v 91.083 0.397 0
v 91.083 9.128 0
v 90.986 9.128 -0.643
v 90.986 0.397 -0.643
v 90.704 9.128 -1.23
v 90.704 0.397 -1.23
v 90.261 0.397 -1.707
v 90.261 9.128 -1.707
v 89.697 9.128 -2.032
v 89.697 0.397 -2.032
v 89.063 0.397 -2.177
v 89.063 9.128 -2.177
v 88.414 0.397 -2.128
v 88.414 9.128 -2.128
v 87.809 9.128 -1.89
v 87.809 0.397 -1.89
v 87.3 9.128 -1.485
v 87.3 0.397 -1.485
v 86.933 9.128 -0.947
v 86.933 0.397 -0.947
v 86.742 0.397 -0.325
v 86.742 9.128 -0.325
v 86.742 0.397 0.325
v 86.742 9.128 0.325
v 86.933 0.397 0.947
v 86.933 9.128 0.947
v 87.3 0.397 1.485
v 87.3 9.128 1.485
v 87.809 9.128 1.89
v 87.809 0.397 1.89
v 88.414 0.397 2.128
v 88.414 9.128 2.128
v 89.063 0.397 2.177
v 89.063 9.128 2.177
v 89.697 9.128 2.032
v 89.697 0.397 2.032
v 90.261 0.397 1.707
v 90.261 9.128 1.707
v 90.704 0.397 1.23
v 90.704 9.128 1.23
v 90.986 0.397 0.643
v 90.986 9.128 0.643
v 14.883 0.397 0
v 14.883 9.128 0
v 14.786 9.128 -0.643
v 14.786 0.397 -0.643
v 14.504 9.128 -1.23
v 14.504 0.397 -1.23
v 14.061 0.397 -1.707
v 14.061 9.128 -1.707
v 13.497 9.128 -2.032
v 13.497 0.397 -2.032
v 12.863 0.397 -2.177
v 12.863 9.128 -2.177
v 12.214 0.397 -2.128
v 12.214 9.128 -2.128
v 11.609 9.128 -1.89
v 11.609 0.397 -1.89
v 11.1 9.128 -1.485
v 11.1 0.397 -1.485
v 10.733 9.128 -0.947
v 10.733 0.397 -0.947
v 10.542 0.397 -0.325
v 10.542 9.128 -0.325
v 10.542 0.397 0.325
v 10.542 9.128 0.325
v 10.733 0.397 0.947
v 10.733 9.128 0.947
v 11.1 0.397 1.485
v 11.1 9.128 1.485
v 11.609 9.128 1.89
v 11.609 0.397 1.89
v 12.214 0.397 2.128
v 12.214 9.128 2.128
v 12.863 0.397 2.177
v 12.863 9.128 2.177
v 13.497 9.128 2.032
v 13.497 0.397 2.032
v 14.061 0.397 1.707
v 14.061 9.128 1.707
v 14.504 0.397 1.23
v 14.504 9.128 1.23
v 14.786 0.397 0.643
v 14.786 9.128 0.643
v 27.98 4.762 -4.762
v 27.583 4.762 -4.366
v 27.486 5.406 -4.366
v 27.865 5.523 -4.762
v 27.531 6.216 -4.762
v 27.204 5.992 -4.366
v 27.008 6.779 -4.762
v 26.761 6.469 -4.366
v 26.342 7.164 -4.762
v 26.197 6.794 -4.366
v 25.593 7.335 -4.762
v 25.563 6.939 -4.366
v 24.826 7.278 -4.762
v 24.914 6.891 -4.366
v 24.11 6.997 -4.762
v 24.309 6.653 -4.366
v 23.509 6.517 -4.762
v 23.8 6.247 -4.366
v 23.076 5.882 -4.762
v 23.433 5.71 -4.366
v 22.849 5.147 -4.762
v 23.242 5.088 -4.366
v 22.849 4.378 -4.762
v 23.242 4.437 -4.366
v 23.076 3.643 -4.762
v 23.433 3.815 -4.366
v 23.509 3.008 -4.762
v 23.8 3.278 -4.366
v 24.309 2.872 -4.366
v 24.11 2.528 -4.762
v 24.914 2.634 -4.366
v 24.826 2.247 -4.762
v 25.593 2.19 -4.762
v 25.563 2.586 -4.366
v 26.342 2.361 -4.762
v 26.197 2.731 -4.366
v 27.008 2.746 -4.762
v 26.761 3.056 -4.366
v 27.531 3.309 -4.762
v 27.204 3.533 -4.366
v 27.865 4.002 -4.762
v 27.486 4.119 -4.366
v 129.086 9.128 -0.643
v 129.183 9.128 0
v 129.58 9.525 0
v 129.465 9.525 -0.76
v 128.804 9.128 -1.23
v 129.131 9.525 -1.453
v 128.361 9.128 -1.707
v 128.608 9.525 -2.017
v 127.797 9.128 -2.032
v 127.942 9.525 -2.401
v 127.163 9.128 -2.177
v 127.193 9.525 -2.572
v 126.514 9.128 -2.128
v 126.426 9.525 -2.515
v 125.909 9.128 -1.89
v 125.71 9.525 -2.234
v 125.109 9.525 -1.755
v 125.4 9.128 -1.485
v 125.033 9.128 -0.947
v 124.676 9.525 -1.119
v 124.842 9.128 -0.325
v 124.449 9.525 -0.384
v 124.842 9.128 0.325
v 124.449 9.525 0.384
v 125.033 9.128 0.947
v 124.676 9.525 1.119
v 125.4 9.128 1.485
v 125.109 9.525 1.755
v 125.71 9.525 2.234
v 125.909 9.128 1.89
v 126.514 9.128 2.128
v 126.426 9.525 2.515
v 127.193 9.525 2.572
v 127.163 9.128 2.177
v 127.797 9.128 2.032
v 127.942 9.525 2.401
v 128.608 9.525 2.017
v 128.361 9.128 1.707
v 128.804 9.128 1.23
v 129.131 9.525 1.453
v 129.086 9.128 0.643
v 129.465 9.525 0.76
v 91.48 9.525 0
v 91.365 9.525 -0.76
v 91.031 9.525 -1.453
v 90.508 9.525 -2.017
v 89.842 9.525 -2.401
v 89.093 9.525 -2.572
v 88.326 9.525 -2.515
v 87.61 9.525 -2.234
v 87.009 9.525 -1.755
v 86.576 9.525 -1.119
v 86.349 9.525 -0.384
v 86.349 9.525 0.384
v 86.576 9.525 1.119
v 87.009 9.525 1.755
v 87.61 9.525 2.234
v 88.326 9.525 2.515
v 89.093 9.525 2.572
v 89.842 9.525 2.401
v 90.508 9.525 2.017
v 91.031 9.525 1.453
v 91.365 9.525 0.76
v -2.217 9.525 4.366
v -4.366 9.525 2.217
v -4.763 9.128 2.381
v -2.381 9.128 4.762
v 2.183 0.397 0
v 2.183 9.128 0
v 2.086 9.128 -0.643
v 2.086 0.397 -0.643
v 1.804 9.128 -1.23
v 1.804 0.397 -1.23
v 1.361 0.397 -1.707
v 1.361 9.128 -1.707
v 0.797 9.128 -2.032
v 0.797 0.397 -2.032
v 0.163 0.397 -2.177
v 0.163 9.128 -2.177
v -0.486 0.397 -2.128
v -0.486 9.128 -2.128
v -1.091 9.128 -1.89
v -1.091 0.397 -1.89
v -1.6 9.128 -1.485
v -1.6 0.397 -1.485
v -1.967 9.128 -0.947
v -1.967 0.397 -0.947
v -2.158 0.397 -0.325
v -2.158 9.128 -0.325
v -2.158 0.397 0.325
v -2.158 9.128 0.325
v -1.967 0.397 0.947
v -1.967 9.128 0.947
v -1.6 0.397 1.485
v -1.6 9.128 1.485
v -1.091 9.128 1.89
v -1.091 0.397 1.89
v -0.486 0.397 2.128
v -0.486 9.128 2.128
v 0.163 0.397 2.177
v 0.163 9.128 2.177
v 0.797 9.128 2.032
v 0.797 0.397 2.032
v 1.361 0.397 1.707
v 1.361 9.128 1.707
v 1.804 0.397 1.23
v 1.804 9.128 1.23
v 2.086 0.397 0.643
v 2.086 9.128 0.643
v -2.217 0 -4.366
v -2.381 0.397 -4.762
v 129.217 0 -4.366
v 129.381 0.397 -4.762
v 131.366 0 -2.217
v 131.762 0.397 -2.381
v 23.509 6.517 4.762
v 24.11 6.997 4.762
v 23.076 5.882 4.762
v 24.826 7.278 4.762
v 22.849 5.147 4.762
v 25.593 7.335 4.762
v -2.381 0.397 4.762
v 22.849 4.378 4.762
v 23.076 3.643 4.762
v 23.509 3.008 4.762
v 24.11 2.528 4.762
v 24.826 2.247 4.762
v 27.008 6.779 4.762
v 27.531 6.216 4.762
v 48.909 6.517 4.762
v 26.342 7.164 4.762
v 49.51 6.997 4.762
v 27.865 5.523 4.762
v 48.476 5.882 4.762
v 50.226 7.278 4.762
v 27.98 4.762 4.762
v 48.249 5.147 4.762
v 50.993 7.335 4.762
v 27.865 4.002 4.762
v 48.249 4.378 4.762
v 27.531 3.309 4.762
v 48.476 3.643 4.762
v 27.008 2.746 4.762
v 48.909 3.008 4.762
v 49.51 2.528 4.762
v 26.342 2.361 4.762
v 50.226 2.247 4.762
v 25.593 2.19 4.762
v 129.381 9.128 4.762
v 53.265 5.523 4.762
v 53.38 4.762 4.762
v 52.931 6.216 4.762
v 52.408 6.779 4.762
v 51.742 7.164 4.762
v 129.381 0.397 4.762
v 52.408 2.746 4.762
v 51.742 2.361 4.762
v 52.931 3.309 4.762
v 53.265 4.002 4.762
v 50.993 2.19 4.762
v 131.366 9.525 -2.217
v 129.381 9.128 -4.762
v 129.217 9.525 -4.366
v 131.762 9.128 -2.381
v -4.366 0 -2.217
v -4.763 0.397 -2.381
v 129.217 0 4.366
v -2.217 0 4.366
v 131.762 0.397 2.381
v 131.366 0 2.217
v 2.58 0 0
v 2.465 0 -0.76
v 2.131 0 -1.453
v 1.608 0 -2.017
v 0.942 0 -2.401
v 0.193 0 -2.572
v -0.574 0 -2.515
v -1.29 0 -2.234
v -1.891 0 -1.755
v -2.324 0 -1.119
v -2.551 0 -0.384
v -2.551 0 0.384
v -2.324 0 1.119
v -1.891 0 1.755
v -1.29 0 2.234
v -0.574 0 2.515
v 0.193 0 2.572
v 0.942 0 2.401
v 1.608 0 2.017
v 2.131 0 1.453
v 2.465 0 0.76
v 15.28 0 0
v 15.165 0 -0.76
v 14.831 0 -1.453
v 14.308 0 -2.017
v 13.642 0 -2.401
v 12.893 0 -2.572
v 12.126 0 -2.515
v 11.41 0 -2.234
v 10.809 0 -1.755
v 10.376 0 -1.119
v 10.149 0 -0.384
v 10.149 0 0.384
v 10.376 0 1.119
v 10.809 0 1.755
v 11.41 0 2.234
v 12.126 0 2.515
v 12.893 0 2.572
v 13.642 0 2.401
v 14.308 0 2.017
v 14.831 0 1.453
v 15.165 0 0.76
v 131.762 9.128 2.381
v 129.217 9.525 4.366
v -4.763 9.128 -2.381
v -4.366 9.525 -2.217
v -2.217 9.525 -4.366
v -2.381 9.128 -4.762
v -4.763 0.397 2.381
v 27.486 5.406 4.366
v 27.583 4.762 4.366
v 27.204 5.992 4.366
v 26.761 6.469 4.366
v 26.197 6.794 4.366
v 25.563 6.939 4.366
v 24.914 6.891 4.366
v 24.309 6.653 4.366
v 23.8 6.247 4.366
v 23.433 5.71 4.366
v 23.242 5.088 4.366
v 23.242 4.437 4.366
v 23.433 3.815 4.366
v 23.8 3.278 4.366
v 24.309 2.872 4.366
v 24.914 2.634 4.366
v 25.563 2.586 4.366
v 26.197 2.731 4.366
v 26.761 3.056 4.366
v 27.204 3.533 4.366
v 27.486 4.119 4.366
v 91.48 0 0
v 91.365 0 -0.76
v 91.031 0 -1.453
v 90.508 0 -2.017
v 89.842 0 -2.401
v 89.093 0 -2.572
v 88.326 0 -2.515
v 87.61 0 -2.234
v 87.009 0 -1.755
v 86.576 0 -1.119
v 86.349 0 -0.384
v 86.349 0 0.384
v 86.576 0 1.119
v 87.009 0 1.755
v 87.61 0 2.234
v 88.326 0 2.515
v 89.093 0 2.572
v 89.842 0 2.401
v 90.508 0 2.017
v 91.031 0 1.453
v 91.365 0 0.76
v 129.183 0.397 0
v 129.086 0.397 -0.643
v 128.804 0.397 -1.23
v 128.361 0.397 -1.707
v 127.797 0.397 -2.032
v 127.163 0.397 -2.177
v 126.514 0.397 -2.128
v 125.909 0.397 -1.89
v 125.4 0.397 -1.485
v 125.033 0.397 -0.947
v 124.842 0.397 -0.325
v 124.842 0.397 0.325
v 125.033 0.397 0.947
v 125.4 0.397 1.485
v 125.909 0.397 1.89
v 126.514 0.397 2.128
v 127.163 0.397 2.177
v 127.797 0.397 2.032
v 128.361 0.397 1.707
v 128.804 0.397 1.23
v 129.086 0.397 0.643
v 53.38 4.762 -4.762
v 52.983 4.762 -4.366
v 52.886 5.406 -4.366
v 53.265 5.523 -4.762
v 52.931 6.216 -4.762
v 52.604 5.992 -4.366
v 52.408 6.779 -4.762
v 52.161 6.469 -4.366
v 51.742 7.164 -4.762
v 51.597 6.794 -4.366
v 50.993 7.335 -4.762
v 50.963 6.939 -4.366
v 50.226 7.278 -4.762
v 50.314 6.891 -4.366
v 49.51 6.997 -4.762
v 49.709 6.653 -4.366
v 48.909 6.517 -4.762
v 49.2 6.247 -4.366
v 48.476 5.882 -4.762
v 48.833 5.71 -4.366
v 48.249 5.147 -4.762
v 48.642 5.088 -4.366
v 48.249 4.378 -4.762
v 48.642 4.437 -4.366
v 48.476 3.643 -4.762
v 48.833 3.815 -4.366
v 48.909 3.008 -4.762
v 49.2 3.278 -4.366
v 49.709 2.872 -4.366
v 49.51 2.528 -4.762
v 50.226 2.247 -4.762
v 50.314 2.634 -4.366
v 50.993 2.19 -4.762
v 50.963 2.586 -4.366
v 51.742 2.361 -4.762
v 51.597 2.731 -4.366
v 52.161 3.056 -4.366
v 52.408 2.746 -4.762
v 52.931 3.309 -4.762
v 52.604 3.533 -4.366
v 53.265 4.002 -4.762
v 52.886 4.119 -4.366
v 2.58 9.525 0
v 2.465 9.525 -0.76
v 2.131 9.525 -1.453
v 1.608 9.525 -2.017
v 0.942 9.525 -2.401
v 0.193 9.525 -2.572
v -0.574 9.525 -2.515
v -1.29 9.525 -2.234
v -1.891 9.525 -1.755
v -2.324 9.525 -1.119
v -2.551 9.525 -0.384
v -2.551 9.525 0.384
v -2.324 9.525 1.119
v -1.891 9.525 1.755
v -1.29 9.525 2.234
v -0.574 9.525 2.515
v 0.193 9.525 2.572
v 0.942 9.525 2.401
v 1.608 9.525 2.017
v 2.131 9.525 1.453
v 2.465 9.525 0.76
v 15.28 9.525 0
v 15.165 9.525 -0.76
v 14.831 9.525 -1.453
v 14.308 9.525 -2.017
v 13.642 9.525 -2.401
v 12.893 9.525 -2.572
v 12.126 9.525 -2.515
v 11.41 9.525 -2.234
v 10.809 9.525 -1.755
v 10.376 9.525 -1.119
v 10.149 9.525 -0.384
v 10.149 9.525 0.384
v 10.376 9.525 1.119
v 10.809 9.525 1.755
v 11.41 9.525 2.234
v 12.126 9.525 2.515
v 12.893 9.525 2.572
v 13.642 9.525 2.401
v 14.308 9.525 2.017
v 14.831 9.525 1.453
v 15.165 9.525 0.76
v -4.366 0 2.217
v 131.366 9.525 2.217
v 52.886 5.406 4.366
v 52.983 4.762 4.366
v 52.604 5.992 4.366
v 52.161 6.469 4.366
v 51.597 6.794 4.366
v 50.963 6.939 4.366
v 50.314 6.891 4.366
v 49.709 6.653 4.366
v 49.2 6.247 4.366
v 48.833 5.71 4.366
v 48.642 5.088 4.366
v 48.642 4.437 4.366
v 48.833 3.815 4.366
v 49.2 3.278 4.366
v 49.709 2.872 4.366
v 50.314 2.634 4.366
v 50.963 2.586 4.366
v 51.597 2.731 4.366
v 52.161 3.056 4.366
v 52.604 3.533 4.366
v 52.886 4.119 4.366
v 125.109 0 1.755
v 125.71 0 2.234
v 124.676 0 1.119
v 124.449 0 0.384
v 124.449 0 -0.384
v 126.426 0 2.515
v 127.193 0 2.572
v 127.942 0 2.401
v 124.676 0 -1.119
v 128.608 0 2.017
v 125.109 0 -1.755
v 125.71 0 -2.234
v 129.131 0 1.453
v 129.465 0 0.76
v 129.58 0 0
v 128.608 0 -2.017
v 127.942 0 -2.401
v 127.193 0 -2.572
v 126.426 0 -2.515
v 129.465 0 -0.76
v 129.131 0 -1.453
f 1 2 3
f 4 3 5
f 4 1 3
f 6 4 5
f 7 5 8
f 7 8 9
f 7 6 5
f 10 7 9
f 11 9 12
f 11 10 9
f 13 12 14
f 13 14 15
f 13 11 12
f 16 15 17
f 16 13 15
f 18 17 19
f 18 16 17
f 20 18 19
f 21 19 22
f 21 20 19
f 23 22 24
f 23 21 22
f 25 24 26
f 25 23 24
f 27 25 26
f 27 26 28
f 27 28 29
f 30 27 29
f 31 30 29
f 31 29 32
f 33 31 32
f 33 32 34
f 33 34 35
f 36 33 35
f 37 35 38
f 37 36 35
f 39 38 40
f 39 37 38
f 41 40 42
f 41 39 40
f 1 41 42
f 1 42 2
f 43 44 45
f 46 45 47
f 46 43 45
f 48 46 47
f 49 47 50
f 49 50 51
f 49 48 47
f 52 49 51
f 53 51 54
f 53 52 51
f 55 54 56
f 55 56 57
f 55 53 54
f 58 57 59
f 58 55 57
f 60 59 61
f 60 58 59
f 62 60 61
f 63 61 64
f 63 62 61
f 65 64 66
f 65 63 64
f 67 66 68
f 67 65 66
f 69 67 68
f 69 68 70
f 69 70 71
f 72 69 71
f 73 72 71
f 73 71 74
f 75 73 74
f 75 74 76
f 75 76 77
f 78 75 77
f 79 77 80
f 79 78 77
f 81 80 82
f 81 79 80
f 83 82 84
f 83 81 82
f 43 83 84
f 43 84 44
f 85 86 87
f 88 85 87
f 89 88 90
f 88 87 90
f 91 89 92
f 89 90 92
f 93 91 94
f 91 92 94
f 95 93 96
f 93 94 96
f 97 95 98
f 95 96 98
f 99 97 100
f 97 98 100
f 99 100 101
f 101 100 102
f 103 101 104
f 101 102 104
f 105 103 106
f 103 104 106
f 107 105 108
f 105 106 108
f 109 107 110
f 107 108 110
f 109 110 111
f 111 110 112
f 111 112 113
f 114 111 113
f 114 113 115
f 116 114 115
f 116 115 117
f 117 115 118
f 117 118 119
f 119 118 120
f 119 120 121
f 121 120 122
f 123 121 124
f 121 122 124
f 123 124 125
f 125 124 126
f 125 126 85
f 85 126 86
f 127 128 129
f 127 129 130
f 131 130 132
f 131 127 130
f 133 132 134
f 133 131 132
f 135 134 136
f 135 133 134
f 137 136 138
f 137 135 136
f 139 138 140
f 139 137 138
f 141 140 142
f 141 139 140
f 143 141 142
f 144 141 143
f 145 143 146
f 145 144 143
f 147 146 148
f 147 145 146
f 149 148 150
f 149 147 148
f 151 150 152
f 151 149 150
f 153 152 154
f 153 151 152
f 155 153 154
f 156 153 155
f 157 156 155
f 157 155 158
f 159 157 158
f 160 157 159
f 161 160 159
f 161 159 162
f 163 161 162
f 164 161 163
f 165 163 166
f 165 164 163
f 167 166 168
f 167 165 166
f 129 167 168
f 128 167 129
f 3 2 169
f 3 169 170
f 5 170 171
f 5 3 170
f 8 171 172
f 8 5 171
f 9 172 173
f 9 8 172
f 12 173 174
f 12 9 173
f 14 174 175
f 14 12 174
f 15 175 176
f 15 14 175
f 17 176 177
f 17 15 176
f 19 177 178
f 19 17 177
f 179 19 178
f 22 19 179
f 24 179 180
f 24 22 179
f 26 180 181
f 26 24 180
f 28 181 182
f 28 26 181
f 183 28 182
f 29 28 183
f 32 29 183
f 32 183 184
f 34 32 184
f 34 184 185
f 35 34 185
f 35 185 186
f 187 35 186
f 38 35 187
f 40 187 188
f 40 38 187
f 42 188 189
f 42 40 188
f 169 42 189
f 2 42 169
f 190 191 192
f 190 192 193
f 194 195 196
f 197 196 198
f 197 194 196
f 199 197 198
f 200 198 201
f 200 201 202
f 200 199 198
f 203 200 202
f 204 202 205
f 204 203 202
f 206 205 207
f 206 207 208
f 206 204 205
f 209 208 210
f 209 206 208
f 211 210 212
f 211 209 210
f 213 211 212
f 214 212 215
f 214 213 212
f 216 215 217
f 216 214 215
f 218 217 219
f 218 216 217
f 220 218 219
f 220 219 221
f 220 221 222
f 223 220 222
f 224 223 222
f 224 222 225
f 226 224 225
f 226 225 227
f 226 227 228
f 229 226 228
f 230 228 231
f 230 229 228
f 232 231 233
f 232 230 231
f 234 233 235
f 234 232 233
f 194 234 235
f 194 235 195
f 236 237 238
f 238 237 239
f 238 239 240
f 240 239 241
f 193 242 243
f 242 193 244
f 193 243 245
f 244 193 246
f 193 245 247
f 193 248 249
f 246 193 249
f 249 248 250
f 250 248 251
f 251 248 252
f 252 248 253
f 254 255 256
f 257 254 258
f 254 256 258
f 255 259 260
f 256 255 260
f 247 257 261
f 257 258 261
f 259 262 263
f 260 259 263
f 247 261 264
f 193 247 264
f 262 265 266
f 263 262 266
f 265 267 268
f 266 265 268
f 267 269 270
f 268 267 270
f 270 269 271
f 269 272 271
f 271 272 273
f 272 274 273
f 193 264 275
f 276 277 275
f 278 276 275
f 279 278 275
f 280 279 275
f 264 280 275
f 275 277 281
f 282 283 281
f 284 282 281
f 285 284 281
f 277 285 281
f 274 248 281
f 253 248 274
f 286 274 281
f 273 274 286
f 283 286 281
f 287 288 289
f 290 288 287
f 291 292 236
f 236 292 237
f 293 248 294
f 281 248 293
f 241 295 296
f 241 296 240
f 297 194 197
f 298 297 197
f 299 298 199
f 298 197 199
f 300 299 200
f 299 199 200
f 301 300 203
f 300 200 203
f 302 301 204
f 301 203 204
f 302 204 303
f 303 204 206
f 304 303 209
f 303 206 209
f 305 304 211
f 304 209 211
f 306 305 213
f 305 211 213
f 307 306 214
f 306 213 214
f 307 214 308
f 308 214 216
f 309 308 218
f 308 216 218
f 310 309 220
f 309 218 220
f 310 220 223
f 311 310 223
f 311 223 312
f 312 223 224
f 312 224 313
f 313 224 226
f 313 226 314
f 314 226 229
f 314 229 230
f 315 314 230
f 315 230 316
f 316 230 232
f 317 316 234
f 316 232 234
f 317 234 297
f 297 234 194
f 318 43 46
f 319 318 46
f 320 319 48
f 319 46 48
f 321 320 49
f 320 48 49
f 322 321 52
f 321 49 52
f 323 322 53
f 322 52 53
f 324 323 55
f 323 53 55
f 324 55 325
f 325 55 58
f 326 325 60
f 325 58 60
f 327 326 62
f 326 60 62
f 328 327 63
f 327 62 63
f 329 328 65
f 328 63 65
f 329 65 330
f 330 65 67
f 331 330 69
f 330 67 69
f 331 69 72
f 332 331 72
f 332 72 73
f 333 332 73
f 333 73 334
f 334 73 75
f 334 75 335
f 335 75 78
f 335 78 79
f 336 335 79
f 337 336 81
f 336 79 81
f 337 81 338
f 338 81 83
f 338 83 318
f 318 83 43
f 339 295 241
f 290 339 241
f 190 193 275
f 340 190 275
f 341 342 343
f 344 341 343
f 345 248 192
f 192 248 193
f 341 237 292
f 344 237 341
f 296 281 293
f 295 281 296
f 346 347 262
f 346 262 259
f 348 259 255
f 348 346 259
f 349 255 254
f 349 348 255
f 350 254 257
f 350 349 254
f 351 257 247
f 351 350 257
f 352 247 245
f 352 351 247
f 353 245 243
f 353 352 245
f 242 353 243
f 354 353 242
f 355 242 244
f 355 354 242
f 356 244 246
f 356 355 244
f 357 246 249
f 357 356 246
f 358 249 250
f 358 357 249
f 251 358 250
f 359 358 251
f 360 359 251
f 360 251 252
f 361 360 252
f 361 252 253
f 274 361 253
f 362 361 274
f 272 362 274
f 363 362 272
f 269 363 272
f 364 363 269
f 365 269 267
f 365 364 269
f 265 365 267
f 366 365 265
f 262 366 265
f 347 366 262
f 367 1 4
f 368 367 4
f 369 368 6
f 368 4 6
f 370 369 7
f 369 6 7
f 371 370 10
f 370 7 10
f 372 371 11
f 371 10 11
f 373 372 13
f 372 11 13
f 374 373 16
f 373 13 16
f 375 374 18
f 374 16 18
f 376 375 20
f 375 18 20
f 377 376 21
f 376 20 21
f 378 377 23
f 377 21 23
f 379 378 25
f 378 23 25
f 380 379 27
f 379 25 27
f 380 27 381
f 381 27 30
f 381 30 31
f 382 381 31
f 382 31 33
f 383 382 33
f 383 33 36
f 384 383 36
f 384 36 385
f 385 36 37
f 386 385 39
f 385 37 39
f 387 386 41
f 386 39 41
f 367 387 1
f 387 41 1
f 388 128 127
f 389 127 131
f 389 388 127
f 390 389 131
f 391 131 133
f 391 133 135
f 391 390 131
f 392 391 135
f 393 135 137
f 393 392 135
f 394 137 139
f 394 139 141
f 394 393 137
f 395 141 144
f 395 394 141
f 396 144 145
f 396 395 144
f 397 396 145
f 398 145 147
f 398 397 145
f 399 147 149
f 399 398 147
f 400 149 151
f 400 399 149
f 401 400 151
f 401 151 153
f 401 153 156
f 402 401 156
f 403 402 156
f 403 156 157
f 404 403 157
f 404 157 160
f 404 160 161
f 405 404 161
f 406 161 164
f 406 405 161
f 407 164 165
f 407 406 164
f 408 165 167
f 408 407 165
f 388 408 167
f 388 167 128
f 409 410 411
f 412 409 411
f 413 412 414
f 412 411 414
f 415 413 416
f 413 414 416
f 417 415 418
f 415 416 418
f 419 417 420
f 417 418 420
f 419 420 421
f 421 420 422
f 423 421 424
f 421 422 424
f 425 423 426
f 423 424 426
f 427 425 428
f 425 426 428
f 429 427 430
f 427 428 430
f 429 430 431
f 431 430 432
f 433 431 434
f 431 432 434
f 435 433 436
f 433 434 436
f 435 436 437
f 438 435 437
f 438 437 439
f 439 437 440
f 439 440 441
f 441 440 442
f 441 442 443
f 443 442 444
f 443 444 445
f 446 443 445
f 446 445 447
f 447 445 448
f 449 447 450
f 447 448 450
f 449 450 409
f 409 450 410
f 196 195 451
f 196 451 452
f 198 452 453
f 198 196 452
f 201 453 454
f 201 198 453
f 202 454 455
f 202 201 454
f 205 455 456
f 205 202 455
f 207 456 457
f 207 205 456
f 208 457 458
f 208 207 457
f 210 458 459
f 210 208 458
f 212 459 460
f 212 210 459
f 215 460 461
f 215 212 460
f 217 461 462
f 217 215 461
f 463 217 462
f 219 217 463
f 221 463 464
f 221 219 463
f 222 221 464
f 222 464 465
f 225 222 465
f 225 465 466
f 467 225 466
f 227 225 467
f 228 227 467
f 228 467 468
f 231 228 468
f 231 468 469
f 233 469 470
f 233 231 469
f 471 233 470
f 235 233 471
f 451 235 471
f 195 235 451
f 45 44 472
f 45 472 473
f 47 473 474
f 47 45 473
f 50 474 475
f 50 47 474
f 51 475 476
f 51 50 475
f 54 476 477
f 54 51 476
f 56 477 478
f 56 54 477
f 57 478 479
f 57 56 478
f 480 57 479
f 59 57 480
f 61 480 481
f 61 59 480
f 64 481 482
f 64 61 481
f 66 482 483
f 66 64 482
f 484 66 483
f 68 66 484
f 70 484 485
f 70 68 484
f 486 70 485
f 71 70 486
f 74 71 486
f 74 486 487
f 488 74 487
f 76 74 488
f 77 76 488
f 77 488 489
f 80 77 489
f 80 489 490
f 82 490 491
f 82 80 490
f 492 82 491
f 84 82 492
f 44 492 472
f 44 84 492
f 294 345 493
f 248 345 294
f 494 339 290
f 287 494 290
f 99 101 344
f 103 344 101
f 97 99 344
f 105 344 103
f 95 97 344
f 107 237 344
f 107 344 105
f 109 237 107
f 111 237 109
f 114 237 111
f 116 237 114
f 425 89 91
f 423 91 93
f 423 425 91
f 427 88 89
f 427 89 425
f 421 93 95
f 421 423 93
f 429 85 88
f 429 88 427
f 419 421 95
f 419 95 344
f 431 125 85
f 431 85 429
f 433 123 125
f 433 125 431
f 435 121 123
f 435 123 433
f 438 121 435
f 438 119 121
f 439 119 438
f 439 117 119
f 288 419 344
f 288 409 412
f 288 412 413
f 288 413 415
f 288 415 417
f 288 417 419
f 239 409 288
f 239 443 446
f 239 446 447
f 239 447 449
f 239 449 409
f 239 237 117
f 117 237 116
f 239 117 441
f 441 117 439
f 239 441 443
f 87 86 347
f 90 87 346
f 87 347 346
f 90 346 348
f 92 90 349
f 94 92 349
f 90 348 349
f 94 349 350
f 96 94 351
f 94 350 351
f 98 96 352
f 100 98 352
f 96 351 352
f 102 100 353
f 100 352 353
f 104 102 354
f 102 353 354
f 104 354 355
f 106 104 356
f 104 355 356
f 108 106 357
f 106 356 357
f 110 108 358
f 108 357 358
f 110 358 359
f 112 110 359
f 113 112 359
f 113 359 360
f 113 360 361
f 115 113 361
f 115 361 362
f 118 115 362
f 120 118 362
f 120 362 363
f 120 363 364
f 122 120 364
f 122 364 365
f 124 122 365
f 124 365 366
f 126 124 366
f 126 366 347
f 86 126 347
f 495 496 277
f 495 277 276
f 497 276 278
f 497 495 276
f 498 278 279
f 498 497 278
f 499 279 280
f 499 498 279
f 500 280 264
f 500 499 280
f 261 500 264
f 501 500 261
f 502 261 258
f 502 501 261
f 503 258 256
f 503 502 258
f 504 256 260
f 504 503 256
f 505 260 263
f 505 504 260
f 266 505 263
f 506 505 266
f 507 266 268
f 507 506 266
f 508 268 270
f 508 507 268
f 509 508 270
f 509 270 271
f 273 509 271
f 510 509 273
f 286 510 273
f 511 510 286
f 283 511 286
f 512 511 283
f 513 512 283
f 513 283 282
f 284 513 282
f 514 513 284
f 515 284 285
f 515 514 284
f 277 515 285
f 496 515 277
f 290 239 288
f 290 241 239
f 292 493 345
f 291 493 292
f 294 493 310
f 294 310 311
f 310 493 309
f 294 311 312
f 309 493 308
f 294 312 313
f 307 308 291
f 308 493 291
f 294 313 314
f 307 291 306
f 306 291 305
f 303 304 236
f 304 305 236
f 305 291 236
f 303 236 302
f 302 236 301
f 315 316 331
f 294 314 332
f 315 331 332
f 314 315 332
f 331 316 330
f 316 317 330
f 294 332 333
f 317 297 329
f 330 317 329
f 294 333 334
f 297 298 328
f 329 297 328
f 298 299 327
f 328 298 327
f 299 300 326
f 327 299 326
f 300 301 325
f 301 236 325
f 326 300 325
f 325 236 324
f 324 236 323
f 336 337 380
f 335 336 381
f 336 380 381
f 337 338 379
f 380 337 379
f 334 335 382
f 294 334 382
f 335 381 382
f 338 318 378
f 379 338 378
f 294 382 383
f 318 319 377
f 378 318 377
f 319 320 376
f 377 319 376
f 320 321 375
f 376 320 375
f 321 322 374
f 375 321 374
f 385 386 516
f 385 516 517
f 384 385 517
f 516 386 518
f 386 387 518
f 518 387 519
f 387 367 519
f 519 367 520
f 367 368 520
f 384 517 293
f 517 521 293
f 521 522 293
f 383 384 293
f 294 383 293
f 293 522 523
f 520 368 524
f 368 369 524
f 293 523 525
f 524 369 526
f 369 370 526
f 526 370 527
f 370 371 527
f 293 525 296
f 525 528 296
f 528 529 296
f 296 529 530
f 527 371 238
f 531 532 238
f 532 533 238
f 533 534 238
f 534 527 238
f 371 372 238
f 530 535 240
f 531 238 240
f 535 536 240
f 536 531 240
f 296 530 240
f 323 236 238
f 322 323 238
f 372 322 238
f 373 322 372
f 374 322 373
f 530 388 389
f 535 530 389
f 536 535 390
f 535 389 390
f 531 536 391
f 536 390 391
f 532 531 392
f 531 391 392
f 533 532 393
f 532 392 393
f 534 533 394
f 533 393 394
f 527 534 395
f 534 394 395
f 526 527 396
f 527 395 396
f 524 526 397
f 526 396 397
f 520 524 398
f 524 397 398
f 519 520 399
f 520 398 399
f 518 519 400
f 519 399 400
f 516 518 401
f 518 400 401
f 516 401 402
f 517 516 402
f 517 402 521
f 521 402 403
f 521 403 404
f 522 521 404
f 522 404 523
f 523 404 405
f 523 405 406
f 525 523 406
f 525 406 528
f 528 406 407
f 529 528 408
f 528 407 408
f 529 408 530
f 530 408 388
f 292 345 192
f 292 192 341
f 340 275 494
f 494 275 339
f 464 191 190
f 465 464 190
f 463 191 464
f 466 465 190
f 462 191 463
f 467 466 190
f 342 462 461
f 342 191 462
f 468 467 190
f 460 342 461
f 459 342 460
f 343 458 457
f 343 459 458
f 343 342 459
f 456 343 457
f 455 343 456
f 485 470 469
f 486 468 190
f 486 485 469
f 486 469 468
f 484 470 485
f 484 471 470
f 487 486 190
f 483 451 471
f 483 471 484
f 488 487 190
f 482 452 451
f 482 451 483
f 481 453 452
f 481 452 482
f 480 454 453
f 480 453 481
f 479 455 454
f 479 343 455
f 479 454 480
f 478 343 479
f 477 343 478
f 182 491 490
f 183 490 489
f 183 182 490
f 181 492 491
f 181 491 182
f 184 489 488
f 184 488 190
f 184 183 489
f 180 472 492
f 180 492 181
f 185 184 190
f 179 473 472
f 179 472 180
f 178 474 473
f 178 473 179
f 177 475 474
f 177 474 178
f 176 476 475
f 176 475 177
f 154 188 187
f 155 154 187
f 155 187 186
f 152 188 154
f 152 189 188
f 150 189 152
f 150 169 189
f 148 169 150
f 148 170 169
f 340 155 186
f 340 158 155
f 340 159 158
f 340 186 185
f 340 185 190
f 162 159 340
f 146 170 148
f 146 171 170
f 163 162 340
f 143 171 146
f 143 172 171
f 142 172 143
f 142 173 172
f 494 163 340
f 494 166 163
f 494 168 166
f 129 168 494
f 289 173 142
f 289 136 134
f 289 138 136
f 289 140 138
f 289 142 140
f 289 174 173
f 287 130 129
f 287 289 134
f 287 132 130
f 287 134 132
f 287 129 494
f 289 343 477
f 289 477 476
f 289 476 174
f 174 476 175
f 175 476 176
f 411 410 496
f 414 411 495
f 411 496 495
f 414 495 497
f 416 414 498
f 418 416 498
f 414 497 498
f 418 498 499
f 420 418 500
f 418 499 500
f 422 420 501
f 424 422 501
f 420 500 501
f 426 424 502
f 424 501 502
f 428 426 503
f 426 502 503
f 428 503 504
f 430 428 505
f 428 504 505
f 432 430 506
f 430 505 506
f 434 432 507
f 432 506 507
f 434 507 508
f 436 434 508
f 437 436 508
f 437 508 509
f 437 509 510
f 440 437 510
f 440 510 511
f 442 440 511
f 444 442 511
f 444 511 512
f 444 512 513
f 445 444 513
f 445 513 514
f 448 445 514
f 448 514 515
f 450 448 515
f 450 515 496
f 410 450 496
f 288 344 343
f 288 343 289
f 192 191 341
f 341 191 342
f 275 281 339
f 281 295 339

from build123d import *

# Parameters (mm, degrees)
SKETCH1_W               = 136.525
SKETCH1_H               = 9.525
SKETCH1_R               = 2.1828125
BOSS_EXTRUDE1_DEPTH     = 9.525
SKETCH2_R               = 2.1828125
CUT_EXTRUDE1_DEPTH      = 1
CUT_EXTRUDE1_DEPTH_BACK = 10.525
CHAMFER1_SIZE           = 2.38125
CHAMFER2_SIZE           = 0.396875


with BuildPart() as part:
    # Sketch1 → Boss-Extrude1 (new body)
    with BuildSketch(Plane(origin=(0, 0, 0), x_dir=(1, 0, 0), z_dir=(0, 1, 0))):
        with Locations((63.5, 0)):
            Rectangle(SKETCH1_W, SKETCH1_H)
        Circle(SKETCH1_R, mode=Mode.SUBTRACT)
        with Locations((12.7, 0)):
            Circle(SKETCH1_R, mode=Mode.SUBTRACT)
        with Locations((127, 0)):
            Circle(SKETCH1_R, mode=Mode.SUBTRACT)
        with Locations((88.9, 0)):
            Circle(SKETCH1_R, mode=Mode.SUBTRACT)
    extrude(amount=BOSS_EXTRUDE1_DEPTH)

    # Sketch2 → Cut-Extrude1 (cut, two sides)
    with BuildSketch(Plane.XY.offset(4.7625)) as cut_extrude1_sk:
        with Locations((25.4, 4.7625)):
            Circle(SKETCH2_R)
        with Locations((50.8, 4.7625)):
            Circle(SKETCH2_R)
    extrude(amount=CUT_EXTRUDE1_DEPTH, mode=Mode.SUBTRACT)
    extrude(cut_extrude1_sk.sketch, amount=-CUT_EXTRUDE1_DEPTH_BACK, mode=Mode.SUBTRACT)

    # Chamfer1
    chamfer1_edges = [part.edges().sort_by_distance(p)[0] for p in [
        (-4.7625, 4.7625, -4.7625),
        (131.7625, 4.7625, -4.7625),
        (131.7625, 4.7625, 4.7625),
        (-4.7625, 4.7625, 4.7625),
    ]]
    chamfer(chamfer1_edges, length=CHAMFER1_SIZE)

    # Chamfer2
    chamfer2_edges = [part.edges().sort_by_distance(p)[0] for p in [
        (-2.1828125, 0, 0),
        (-2.1828125, 9.525, 0),
        (10.5171875, 0, 0),
        (10.5171875, 9.525, 0),
        (124.8171875, 0, 0),
        (124.8171875, 9.525, 0),
        (86.7171875, 0, 0),
        (86.7171875, 9.525, 0),
        (23.2171875, 4.7625, -4.7625),
        (23.2171875, 4.7625, 4.7625),
        (48.6171875, 4.7625, -4.7625),
        (48.6171875, 4.7625, 4.7625),
        (63.5, 0, -4.7625),
        (63.5, 9.525, -4.7625),
        (-4.7625, 0, 0),
        (131.7625, 0, 0),
        (63.5, 0, 4.7625),
        (-3.571875, 0, 3.571875),
        (-3.571875, 0, -3.571875),
        (130.571875, 0, 3.571875),
        (130.571875, 0, -3.571875),
        (131.7625, 9.525, 0),
        (-4.7625, 9.525, 0),
        (63.5, 9.525, 4.7625),
        (-3.571875, 9.525, 3.571875),
        (-3.571875, 9.525, -3.571875),
        (130.571875, 9.525, 3.571875),
        (130.571875, 9.525, -3.571875),
    ]]
    chamfer(chamfer2_edges, length=CHAMFER2_SIZE)


solid = part.part
